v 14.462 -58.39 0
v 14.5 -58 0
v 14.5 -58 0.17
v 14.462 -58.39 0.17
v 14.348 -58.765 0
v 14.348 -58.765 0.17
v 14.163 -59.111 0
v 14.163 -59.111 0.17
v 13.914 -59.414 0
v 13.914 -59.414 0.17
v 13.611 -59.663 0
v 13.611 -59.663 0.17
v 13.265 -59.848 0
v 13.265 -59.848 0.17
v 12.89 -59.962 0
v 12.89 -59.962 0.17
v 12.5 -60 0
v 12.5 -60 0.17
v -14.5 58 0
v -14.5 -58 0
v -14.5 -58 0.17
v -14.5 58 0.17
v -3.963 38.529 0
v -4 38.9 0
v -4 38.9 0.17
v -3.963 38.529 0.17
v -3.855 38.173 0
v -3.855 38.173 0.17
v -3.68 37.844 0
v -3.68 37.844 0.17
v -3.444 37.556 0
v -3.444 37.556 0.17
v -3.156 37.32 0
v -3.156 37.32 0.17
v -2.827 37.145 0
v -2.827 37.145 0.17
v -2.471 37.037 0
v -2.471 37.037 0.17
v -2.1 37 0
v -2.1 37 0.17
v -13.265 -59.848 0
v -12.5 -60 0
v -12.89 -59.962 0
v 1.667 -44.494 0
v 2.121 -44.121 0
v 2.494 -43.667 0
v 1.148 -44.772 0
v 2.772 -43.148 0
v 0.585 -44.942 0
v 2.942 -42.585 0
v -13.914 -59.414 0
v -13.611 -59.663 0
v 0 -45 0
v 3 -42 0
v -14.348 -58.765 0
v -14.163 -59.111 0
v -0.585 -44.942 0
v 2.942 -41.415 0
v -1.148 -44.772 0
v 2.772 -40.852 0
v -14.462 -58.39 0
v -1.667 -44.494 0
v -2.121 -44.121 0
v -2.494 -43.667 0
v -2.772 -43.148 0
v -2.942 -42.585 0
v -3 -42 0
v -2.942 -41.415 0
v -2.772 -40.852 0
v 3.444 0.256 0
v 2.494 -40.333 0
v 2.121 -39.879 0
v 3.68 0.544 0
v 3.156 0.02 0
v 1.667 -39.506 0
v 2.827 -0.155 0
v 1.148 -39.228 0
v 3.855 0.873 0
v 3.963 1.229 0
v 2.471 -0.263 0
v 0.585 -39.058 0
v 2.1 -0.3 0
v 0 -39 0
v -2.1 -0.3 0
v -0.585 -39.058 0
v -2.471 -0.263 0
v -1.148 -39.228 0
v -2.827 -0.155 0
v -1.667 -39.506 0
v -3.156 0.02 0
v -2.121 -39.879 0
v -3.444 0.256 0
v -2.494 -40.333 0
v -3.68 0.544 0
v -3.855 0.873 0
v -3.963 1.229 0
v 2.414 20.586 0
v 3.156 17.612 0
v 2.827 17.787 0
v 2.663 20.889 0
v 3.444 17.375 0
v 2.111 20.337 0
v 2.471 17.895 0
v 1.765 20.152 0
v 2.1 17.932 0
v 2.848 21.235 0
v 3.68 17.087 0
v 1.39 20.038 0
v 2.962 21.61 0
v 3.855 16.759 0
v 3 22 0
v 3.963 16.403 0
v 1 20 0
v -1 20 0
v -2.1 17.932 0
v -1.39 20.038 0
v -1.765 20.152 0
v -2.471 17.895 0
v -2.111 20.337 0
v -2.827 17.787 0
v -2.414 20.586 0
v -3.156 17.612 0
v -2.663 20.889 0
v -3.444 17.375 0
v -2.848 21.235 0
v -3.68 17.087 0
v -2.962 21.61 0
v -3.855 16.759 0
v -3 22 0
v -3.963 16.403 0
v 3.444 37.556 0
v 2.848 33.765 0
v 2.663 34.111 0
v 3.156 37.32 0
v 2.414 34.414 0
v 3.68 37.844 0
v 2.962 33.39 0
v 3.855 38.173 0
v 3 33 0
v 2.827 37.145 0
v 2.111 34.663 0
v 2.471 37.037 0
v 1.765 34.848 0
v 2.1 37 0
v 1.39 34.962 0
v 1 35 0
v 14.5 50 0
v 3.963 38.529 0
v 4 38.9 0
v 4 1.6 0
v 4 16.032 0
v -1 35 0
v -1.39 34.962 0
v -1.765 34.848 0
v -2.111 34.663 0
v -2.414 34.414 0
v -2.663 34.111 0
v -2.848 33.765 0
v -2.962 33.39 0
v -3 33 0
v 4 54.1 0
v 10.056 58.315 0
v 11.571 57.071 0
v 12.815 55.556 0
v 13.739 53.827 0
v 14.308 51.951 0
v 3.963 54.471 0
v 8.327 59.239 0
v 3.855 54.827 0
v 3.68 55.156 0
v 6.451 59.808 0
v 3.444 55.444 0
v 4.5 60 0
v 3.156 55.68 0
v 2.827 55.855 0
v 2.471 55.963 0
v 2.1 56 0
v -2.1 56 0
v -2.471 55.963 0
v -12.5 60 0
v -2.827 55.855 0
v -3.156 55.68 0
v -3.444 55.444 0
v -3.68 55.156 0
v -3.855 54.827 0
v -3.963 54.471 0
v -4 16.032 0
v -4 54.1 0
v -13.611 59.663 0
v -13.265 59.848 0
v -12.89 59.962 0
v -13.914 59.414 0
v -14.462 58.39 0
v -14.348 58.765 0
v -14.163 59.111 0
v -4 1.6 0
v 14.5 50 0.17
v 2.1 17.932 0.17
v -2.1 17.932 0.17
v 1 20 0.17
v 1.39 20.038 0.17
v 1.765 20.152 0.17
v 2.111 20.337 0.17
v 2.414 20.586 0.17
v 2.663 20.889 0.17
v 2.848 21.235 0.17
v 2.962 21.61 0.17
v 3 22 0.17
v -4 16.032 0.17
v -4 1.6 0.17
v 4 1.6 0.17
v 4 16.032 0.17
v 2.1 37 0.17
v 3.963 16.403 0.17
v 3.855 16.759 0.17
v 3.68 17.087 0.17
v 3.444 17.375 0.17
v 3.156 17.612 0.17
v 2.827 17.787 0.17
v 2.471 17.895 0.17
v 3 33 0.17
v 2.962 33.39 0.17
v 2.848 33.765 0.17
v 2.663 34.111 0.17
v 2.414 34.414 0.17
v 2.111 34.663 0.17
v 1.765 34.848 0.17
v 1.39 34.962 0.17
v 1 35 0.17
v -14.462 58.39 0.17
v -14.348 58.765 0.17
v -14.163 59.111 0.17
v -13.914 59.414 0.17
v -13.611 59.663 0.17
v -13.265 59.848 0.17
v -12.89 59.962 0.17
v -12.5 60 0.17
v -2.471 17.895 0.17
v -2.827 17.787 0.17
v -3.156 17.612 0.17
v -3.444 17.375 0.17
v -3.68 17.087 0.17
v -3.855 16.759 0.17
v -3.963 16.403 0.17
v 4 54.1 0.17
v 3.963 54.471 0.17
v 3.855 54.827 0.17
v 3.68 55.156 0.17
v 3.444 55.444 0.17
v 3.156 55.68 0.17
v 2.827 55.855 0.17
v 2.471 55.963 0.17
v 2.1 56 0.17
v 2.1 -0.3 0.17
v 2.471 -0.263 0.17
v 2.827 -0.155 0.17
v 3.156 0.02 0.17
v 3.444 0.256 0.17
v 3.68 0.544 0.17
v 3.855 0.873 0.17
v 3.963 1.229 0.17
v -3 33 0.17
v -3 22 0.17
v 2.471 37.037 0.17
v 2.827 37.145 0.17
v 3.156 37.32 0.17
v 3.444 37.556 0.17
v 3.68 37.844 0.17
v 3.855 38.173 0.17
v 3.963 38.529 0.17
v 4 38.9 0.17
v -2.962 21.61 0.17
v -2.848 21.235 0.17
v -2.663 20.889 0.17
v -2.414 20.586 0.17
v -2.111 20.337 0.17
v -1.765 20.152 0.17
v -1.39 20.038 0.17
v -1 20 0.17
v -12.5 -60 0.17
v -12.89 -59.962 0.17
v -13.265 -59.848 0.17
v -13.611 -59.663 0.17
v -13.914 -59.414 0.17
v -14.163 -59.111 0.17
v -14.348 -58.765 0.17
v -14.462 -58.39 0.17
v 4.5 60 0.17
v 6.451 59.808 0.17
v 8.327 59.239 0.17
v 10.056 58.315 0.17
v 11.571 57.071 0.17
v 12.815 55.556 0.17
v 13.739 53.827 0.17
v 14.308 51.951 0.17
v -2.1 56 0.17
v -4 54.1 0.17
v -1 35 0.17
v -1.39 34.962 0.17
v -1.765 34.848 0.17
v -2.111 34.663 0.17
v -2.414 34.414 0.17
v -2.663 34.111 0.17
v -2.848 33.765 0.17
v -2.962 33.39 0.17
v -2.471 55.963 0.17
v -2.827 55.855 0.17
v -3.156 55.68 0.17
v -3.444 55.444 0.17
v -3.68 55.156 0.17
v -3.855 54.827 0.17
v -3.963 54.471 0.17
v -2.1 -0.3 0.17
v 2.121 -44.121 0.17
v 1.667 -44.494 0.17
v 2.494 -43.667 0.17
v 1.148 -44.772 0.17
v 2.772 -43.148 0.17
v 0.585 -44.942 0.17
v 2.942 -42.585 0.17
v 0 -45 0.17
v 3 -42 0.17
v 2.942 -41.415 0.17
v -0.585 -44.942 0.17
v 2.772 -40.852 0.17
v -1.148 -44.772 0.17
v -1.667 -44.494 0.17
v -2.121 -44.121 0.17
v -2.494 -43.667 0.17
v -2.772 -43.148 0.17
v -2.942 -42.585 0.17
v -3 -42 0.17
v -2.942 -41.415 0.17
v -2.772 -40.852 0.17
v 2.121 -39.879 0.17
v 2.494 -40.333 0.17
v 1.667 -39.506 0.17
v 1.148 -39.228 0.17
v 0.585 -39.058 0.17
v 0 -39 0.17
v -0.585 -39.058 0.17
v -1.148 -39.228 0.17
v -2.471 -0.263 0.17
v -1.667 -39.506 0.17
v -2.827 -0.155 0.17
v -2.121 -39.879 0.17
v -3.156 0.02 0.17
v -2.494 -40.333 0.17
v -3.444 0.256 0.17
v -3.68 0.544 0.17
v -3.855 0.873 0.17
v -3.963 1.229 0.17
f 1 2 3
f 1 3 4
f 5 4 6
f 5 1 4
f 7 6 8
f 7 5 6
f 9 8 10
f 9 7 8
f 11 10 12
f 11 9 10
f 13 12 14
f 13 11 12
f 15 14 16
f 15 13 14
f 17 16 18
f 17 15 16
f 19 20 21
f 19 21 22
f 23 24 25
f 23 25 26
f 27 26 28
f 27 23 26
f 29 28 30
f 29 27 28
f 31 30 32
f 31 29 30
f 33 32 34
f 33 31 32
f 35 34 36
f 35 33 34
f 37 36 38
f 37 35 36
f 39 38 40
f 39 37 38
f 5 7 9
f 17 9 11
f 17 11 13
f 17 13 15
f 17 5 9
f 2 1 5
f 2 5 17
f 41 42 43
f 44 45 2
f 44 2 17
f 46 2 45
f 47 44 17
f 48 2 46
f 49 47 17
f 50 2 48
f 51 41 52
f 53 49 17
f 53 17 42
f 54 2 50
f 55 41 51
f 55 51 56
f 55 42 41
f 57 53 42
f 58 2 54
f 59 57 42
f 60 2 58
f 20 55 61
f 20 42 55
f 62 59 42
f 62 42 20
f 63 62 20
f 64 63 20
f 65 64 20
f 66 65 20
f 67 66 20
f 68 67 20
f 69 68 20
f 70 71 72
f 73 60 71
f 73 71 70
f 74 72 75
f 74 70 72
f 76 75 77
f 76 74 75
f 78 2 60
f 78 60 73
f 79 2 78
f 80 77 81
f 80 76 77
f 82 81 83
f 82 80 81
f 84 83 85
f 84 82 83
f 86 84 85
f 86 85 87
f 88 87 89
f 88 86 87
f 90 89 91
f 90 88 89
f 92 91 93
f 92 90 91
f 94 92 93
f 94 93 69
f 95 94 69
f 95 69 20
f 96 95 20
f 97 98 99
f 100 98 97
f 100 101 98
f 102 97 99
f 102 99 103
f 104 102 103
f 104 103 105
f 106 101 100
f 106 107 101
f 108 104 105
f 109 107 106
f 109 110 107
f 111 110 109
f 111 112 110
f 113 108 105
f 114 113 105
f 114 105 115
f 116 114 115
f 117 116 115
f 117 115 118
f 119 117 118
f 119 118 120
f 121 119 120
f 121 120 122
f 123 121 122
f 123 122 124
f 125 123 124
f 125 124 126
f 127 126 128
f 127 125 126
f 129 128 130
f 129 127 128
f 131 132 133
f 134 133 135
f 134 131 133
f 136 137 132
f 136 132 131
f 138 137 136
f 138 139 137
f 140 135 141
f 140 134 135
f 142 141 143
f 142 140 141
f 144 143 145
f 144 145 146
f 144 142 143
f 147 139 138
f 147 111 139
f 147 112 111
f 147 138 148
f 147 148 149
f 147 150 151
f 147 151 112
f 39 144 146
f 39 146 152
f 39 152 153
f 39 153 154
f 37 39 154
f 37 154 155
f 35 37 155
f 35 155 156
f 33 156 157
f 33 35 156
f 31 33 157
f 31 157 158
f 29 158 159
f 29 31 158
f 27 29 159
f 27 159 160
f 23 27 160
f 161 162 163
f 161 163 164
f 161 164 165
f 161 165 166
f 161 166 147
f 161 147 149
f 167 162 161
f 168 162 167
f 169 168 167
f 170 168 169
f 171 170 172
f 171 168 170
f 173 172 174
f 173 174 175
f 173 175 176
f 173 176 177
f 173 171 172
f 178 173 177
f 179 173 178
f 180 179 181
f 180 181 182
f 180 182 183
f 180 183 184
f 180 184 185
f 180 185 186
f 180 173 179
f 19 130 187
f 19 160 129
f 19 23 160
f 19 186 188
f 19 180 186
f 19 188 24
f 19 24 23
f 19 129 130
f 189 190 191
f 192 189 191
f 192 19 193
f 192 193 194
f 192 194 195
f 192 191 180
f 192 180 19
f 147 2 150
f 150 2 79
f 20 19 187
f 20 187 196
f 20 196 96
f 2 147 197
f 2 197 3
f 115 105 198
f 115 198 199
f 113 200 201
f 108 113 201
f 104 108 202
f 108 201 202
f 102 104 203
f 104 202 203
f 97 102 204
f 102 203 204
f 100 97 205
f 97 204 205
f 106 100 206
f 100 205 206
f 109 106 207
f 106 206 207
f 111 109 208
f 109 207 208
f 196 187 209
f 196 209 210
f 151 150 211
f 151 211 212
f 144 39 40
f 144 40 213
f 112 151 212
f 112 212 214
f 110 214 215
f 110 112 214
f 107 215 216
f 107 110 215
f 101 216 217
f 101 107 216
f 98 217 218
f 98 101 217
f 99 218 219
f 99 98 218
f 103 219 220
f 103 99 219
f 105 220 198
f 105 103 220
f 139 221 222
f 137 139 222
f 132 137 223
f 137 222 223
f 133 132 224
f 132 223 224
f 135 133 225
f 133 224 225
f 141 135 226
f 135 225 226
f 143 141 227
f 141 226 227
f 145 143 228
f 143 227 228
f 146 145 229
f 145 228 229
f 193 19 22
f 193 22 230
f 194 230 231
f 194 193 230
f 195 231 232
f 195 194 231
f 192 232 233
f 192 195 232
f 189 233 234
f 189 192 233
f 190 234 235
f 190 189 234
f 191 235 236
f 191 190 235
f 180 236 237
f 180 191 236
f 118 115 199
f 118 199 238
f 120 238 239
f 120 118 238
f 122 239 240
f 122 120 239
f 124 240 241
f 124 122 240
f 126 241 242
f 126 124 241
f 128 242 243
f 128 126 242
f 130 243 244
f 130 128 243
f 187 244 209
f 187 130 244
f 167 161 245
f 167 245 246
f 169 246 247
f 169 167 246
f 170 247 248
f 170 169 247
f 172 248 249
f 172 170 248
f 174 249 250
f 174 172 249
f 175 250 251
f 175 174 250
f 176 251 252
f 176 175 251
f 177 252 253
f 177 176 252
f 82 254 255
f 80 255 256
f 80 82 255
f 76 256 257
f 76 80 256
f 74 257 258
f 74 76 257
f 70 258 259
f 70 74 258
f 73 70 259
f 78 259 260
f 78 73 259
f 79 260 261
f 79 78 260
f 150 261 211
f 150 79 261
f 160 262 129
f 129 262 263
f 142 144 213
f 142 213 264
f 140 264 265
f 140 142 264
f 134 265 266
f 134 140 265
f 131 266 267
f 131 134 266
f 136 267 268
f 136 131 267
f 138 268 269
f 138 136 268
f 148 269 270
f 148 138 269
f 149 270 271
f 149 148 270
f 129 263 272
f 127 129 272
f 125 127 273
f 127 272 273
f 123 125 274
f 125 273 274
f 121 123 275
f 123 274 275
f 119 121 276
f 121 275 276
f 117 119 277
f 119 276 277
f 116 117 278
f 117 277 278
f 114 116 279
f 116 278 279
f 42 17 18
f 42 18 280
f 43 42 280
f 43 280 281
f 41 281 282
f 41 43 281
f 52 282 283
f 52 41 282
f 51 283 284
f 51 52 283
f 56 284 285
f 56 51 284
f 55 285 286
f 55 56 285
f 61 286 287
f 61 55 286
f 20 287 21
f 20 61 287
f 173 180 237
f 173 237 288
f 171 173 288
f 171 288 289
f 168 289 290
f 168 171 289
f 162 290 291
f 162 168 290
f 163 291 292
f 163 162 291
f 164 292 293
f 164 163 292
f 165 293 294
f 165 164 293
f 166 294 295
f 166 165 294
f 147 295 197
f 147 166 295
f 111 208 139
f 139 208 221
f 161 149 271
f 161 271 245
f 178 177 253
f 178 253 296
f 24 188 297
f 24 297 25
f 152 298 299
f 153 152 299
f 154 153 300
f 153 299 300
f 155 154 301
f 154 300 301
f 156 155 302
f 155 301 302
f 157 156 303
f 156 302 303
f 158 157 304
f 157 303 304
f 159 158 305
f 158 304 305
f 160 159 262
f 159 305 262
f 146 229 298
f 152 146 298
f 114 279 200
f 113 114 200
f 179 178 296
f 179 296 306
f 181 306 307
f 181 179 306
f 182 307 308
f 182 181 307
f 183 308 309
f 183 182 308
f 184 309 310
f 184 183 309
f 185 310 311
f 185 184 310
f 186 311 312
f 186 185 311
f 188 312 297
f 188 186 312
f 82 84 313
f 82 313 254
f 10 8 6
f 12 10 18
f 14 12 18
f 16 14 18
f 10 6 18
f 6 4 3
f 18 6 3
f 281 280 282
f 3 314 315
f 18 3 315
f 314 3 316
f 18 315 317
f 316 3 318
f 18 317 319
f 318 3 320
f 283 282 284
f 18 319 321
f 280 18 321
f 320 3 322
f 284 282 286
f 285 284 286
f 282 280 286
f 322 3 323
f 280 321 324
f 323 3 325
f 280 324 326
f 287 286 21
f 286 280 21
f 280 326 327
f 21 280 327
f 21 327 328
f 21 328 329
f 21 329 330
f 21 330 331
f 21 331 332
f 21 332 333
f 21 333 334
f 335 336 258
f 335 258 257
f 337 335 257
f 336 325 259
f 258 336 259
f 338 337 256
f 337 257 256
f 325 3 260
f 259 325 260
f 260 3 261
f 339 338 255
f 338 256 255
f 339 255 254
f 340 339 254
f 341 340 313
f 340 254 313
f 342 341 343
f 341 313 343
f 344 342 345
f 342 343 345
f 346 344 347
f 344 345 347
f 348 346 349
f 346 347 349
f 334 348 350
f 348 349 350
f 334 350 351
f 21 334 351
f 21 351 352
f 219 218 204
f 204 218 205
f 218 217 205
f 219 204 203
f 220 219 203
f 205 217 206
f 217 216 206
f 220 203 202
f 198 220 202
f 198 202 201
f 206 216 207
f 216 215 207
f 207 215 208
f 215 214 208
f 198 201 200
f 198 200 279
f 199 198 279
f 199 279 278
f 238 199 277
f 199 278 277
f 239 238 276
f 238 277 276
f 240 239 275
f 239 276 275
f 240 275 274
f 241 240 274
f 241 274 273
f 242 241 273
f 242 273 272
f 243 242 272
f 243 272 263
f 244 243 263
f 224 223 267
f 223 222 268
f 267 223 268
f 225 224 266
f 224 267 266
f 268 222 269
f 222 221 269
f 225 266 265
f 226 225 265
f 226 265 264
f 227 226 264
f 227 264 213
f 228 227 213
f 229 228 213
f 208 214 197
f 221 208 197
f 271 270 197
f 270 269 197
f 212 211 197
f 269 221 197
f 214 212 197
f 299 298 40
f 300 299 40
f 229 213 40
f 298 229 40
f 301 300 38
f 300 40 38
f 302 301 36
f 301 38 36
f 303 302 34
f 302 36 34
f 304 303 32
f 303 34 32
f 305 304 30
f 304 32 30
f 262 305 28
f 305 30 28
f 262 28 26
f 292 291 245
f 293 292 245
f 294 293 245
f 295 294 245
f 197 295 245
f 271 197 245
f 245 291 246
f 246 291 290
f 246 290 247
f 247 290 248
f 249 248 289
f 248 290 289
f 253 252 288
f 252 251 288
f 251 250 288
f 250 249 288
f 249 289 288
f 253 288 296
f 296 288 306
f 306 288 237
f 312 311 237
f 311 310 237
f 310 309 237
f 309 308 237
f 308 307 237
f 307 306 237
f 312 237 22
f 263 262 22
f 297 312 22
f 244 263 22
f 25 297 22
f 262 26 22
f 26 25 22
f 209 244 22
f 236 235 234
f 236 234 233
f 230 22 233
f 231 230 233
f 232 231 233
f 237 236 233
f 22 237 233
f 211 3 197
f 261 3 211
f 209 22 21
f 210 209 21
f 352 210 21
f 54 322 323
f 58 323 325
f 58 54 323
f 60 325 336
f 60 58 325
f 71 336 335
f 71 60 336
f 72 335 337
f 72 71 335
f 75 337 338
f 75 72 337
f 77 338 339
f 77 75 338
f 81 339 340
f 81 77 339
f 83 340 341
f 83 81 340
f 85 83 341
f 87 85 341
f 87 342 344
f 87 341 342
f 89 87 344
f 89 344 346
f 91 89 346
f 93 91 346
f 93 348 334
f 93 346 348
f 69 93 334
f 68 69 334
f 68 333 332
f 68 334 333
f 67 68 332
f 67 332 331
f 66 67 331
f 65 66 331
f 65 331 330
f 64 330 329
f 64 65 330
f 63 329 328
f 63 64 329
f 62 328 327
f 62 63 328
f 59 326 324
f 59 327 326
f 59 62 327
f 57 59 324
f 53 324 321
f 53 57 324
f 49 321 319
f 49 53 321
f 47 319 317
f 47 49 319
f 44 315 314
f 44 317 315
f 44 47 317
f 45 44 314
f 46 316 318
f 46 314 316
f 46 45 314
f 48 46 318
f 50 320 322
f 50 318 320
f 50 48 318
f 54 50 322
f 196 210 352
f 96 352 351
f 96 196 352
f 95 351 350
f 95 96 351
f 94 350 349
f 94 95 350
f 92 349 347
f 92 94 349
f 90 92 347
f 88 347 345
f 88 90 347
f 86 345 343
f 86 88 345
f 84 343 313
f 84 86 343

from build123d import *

# Parameters (mm, degrees)
BOSS_EXTRUDE5_DEPTH = 0.17
SKETCH1_R           = 3
CUT_EXTRUDE1_DEPTH  = 62.727456614
CUT_EXTRUDE2_DEPTH  = 62.727456614


with BuildPart() as part:
    # Sketch7 → Boss-Extrude5 (new body)
    with BuildSketch(Plane.XY):
        with BuildLine():
            Line((-12.5, 60), (4.5, 60))
            ThreePointArc((4.5, 60), (11.571067812, 57.071067812), (14.5, 50))
            Line((14.5, 50), (14.5, -58))
            ThreePointArc((14.5, -58), (13.914213562, -59.414213562), (12.5, -60))
            Line((12.5, -60), (-12.5, -60))
            ThreePointArc((-12.5, -60), (-13.914213562, -59.414213562), (-14.5, -58))
            Line((-14.5, -58), (-14.5, 58))
            ThreePointArc((-14.5, 58), (-13.914213562, 59.414213562), (-12.5, 60))
        make_face()
    extrude(amount=BOSS_EXTRUDE5_DEPTH)

    # Sketch1 (on Front Plane) → Cut-Extrude1 (cut, through all)
    with BuildSketch(Plane.XY):
        with Locations((0, -42)):
            Circle(SKETCH1_R)
        with BuildLine():
            Line((-2.1, -0.3), (2.1, -0.3))
            ThreePointArc((2.1, -0.3), (3.443502884, 0.256497116), (4, 1.6))
            Line((4, 1.6), (4, 16.031829774))
            ThreePointArc((4, 16.031829774), (3.443502884, 17.375332658), (2.1, 17.931829774))
            Line((2.1, 17.931829774), (-2.1, 17.931829774))
            ThreePointArc((-2.1, 17.931829774), (-3.443502884, 17.375332658), (-4, 16.031829774))
            Line((-4, 16.031829774), (-4, 1.6))
            ThreePointArc((-4, 1.6), (-3.443502884, 0.256497116), (-2.1, -0.3))
        make_face()
        with BuildLine():
            Line((2.1, 56), (-2.1, 56))
            ThreePointArc((-2.1, 56), (-3.443502884, 55.443502884), (-4, 54.1))
            Line((-4, 54.1), (-4, 38.9))
            ThreePointArc((-4, 38.9), (-3.443502884, 37.556497116), (-2.1, 37))
            Line((-2.1, 37), (2.1, 37))
            ThreePointArc((2.1, 37), (3.443502884, 37.556497116), (4, 38.9))
            Line((4, 38.9), (4, 54.1))
            ThreePointArc((4, 54.1), (3.443502884, 55.443502884), (2.1, 56))
        make_face()
    extrude(amount=CUT_EXTRUDE1_DEPTH, mode=Mode.SUBTRACT)

    # Sketch8 → Cut-Extrude2 (cut, through all)
    with BuildSketch(Plane.XY.offset(0.17)):
        with BuildLine():
            Line((-3, 33), (-3, 22))
            ThreePointArc((-3, 22), (-2.414213562, 20.585786438), (-1, 20))
            Line((-1, 20), (1, 20))
            ThreePointArc((1, 20), (2.414213562, 20.585786438), (3, 22))
            Line((3, 22), (3, 33))
            ThreePointArc((3, 33), (2.414213562, 34.414213562), (1, 35))
            Line((1, 35), (-1, 35))
            ThreePointArc((-1, 35), (-2.414213562, 34.414213562), (-3, 33))
        make_face()
    extrude(amount=-CUT_EXTRUDE2_DEPTH, mode=Mode.SUBTRACT)


solid = part.part
